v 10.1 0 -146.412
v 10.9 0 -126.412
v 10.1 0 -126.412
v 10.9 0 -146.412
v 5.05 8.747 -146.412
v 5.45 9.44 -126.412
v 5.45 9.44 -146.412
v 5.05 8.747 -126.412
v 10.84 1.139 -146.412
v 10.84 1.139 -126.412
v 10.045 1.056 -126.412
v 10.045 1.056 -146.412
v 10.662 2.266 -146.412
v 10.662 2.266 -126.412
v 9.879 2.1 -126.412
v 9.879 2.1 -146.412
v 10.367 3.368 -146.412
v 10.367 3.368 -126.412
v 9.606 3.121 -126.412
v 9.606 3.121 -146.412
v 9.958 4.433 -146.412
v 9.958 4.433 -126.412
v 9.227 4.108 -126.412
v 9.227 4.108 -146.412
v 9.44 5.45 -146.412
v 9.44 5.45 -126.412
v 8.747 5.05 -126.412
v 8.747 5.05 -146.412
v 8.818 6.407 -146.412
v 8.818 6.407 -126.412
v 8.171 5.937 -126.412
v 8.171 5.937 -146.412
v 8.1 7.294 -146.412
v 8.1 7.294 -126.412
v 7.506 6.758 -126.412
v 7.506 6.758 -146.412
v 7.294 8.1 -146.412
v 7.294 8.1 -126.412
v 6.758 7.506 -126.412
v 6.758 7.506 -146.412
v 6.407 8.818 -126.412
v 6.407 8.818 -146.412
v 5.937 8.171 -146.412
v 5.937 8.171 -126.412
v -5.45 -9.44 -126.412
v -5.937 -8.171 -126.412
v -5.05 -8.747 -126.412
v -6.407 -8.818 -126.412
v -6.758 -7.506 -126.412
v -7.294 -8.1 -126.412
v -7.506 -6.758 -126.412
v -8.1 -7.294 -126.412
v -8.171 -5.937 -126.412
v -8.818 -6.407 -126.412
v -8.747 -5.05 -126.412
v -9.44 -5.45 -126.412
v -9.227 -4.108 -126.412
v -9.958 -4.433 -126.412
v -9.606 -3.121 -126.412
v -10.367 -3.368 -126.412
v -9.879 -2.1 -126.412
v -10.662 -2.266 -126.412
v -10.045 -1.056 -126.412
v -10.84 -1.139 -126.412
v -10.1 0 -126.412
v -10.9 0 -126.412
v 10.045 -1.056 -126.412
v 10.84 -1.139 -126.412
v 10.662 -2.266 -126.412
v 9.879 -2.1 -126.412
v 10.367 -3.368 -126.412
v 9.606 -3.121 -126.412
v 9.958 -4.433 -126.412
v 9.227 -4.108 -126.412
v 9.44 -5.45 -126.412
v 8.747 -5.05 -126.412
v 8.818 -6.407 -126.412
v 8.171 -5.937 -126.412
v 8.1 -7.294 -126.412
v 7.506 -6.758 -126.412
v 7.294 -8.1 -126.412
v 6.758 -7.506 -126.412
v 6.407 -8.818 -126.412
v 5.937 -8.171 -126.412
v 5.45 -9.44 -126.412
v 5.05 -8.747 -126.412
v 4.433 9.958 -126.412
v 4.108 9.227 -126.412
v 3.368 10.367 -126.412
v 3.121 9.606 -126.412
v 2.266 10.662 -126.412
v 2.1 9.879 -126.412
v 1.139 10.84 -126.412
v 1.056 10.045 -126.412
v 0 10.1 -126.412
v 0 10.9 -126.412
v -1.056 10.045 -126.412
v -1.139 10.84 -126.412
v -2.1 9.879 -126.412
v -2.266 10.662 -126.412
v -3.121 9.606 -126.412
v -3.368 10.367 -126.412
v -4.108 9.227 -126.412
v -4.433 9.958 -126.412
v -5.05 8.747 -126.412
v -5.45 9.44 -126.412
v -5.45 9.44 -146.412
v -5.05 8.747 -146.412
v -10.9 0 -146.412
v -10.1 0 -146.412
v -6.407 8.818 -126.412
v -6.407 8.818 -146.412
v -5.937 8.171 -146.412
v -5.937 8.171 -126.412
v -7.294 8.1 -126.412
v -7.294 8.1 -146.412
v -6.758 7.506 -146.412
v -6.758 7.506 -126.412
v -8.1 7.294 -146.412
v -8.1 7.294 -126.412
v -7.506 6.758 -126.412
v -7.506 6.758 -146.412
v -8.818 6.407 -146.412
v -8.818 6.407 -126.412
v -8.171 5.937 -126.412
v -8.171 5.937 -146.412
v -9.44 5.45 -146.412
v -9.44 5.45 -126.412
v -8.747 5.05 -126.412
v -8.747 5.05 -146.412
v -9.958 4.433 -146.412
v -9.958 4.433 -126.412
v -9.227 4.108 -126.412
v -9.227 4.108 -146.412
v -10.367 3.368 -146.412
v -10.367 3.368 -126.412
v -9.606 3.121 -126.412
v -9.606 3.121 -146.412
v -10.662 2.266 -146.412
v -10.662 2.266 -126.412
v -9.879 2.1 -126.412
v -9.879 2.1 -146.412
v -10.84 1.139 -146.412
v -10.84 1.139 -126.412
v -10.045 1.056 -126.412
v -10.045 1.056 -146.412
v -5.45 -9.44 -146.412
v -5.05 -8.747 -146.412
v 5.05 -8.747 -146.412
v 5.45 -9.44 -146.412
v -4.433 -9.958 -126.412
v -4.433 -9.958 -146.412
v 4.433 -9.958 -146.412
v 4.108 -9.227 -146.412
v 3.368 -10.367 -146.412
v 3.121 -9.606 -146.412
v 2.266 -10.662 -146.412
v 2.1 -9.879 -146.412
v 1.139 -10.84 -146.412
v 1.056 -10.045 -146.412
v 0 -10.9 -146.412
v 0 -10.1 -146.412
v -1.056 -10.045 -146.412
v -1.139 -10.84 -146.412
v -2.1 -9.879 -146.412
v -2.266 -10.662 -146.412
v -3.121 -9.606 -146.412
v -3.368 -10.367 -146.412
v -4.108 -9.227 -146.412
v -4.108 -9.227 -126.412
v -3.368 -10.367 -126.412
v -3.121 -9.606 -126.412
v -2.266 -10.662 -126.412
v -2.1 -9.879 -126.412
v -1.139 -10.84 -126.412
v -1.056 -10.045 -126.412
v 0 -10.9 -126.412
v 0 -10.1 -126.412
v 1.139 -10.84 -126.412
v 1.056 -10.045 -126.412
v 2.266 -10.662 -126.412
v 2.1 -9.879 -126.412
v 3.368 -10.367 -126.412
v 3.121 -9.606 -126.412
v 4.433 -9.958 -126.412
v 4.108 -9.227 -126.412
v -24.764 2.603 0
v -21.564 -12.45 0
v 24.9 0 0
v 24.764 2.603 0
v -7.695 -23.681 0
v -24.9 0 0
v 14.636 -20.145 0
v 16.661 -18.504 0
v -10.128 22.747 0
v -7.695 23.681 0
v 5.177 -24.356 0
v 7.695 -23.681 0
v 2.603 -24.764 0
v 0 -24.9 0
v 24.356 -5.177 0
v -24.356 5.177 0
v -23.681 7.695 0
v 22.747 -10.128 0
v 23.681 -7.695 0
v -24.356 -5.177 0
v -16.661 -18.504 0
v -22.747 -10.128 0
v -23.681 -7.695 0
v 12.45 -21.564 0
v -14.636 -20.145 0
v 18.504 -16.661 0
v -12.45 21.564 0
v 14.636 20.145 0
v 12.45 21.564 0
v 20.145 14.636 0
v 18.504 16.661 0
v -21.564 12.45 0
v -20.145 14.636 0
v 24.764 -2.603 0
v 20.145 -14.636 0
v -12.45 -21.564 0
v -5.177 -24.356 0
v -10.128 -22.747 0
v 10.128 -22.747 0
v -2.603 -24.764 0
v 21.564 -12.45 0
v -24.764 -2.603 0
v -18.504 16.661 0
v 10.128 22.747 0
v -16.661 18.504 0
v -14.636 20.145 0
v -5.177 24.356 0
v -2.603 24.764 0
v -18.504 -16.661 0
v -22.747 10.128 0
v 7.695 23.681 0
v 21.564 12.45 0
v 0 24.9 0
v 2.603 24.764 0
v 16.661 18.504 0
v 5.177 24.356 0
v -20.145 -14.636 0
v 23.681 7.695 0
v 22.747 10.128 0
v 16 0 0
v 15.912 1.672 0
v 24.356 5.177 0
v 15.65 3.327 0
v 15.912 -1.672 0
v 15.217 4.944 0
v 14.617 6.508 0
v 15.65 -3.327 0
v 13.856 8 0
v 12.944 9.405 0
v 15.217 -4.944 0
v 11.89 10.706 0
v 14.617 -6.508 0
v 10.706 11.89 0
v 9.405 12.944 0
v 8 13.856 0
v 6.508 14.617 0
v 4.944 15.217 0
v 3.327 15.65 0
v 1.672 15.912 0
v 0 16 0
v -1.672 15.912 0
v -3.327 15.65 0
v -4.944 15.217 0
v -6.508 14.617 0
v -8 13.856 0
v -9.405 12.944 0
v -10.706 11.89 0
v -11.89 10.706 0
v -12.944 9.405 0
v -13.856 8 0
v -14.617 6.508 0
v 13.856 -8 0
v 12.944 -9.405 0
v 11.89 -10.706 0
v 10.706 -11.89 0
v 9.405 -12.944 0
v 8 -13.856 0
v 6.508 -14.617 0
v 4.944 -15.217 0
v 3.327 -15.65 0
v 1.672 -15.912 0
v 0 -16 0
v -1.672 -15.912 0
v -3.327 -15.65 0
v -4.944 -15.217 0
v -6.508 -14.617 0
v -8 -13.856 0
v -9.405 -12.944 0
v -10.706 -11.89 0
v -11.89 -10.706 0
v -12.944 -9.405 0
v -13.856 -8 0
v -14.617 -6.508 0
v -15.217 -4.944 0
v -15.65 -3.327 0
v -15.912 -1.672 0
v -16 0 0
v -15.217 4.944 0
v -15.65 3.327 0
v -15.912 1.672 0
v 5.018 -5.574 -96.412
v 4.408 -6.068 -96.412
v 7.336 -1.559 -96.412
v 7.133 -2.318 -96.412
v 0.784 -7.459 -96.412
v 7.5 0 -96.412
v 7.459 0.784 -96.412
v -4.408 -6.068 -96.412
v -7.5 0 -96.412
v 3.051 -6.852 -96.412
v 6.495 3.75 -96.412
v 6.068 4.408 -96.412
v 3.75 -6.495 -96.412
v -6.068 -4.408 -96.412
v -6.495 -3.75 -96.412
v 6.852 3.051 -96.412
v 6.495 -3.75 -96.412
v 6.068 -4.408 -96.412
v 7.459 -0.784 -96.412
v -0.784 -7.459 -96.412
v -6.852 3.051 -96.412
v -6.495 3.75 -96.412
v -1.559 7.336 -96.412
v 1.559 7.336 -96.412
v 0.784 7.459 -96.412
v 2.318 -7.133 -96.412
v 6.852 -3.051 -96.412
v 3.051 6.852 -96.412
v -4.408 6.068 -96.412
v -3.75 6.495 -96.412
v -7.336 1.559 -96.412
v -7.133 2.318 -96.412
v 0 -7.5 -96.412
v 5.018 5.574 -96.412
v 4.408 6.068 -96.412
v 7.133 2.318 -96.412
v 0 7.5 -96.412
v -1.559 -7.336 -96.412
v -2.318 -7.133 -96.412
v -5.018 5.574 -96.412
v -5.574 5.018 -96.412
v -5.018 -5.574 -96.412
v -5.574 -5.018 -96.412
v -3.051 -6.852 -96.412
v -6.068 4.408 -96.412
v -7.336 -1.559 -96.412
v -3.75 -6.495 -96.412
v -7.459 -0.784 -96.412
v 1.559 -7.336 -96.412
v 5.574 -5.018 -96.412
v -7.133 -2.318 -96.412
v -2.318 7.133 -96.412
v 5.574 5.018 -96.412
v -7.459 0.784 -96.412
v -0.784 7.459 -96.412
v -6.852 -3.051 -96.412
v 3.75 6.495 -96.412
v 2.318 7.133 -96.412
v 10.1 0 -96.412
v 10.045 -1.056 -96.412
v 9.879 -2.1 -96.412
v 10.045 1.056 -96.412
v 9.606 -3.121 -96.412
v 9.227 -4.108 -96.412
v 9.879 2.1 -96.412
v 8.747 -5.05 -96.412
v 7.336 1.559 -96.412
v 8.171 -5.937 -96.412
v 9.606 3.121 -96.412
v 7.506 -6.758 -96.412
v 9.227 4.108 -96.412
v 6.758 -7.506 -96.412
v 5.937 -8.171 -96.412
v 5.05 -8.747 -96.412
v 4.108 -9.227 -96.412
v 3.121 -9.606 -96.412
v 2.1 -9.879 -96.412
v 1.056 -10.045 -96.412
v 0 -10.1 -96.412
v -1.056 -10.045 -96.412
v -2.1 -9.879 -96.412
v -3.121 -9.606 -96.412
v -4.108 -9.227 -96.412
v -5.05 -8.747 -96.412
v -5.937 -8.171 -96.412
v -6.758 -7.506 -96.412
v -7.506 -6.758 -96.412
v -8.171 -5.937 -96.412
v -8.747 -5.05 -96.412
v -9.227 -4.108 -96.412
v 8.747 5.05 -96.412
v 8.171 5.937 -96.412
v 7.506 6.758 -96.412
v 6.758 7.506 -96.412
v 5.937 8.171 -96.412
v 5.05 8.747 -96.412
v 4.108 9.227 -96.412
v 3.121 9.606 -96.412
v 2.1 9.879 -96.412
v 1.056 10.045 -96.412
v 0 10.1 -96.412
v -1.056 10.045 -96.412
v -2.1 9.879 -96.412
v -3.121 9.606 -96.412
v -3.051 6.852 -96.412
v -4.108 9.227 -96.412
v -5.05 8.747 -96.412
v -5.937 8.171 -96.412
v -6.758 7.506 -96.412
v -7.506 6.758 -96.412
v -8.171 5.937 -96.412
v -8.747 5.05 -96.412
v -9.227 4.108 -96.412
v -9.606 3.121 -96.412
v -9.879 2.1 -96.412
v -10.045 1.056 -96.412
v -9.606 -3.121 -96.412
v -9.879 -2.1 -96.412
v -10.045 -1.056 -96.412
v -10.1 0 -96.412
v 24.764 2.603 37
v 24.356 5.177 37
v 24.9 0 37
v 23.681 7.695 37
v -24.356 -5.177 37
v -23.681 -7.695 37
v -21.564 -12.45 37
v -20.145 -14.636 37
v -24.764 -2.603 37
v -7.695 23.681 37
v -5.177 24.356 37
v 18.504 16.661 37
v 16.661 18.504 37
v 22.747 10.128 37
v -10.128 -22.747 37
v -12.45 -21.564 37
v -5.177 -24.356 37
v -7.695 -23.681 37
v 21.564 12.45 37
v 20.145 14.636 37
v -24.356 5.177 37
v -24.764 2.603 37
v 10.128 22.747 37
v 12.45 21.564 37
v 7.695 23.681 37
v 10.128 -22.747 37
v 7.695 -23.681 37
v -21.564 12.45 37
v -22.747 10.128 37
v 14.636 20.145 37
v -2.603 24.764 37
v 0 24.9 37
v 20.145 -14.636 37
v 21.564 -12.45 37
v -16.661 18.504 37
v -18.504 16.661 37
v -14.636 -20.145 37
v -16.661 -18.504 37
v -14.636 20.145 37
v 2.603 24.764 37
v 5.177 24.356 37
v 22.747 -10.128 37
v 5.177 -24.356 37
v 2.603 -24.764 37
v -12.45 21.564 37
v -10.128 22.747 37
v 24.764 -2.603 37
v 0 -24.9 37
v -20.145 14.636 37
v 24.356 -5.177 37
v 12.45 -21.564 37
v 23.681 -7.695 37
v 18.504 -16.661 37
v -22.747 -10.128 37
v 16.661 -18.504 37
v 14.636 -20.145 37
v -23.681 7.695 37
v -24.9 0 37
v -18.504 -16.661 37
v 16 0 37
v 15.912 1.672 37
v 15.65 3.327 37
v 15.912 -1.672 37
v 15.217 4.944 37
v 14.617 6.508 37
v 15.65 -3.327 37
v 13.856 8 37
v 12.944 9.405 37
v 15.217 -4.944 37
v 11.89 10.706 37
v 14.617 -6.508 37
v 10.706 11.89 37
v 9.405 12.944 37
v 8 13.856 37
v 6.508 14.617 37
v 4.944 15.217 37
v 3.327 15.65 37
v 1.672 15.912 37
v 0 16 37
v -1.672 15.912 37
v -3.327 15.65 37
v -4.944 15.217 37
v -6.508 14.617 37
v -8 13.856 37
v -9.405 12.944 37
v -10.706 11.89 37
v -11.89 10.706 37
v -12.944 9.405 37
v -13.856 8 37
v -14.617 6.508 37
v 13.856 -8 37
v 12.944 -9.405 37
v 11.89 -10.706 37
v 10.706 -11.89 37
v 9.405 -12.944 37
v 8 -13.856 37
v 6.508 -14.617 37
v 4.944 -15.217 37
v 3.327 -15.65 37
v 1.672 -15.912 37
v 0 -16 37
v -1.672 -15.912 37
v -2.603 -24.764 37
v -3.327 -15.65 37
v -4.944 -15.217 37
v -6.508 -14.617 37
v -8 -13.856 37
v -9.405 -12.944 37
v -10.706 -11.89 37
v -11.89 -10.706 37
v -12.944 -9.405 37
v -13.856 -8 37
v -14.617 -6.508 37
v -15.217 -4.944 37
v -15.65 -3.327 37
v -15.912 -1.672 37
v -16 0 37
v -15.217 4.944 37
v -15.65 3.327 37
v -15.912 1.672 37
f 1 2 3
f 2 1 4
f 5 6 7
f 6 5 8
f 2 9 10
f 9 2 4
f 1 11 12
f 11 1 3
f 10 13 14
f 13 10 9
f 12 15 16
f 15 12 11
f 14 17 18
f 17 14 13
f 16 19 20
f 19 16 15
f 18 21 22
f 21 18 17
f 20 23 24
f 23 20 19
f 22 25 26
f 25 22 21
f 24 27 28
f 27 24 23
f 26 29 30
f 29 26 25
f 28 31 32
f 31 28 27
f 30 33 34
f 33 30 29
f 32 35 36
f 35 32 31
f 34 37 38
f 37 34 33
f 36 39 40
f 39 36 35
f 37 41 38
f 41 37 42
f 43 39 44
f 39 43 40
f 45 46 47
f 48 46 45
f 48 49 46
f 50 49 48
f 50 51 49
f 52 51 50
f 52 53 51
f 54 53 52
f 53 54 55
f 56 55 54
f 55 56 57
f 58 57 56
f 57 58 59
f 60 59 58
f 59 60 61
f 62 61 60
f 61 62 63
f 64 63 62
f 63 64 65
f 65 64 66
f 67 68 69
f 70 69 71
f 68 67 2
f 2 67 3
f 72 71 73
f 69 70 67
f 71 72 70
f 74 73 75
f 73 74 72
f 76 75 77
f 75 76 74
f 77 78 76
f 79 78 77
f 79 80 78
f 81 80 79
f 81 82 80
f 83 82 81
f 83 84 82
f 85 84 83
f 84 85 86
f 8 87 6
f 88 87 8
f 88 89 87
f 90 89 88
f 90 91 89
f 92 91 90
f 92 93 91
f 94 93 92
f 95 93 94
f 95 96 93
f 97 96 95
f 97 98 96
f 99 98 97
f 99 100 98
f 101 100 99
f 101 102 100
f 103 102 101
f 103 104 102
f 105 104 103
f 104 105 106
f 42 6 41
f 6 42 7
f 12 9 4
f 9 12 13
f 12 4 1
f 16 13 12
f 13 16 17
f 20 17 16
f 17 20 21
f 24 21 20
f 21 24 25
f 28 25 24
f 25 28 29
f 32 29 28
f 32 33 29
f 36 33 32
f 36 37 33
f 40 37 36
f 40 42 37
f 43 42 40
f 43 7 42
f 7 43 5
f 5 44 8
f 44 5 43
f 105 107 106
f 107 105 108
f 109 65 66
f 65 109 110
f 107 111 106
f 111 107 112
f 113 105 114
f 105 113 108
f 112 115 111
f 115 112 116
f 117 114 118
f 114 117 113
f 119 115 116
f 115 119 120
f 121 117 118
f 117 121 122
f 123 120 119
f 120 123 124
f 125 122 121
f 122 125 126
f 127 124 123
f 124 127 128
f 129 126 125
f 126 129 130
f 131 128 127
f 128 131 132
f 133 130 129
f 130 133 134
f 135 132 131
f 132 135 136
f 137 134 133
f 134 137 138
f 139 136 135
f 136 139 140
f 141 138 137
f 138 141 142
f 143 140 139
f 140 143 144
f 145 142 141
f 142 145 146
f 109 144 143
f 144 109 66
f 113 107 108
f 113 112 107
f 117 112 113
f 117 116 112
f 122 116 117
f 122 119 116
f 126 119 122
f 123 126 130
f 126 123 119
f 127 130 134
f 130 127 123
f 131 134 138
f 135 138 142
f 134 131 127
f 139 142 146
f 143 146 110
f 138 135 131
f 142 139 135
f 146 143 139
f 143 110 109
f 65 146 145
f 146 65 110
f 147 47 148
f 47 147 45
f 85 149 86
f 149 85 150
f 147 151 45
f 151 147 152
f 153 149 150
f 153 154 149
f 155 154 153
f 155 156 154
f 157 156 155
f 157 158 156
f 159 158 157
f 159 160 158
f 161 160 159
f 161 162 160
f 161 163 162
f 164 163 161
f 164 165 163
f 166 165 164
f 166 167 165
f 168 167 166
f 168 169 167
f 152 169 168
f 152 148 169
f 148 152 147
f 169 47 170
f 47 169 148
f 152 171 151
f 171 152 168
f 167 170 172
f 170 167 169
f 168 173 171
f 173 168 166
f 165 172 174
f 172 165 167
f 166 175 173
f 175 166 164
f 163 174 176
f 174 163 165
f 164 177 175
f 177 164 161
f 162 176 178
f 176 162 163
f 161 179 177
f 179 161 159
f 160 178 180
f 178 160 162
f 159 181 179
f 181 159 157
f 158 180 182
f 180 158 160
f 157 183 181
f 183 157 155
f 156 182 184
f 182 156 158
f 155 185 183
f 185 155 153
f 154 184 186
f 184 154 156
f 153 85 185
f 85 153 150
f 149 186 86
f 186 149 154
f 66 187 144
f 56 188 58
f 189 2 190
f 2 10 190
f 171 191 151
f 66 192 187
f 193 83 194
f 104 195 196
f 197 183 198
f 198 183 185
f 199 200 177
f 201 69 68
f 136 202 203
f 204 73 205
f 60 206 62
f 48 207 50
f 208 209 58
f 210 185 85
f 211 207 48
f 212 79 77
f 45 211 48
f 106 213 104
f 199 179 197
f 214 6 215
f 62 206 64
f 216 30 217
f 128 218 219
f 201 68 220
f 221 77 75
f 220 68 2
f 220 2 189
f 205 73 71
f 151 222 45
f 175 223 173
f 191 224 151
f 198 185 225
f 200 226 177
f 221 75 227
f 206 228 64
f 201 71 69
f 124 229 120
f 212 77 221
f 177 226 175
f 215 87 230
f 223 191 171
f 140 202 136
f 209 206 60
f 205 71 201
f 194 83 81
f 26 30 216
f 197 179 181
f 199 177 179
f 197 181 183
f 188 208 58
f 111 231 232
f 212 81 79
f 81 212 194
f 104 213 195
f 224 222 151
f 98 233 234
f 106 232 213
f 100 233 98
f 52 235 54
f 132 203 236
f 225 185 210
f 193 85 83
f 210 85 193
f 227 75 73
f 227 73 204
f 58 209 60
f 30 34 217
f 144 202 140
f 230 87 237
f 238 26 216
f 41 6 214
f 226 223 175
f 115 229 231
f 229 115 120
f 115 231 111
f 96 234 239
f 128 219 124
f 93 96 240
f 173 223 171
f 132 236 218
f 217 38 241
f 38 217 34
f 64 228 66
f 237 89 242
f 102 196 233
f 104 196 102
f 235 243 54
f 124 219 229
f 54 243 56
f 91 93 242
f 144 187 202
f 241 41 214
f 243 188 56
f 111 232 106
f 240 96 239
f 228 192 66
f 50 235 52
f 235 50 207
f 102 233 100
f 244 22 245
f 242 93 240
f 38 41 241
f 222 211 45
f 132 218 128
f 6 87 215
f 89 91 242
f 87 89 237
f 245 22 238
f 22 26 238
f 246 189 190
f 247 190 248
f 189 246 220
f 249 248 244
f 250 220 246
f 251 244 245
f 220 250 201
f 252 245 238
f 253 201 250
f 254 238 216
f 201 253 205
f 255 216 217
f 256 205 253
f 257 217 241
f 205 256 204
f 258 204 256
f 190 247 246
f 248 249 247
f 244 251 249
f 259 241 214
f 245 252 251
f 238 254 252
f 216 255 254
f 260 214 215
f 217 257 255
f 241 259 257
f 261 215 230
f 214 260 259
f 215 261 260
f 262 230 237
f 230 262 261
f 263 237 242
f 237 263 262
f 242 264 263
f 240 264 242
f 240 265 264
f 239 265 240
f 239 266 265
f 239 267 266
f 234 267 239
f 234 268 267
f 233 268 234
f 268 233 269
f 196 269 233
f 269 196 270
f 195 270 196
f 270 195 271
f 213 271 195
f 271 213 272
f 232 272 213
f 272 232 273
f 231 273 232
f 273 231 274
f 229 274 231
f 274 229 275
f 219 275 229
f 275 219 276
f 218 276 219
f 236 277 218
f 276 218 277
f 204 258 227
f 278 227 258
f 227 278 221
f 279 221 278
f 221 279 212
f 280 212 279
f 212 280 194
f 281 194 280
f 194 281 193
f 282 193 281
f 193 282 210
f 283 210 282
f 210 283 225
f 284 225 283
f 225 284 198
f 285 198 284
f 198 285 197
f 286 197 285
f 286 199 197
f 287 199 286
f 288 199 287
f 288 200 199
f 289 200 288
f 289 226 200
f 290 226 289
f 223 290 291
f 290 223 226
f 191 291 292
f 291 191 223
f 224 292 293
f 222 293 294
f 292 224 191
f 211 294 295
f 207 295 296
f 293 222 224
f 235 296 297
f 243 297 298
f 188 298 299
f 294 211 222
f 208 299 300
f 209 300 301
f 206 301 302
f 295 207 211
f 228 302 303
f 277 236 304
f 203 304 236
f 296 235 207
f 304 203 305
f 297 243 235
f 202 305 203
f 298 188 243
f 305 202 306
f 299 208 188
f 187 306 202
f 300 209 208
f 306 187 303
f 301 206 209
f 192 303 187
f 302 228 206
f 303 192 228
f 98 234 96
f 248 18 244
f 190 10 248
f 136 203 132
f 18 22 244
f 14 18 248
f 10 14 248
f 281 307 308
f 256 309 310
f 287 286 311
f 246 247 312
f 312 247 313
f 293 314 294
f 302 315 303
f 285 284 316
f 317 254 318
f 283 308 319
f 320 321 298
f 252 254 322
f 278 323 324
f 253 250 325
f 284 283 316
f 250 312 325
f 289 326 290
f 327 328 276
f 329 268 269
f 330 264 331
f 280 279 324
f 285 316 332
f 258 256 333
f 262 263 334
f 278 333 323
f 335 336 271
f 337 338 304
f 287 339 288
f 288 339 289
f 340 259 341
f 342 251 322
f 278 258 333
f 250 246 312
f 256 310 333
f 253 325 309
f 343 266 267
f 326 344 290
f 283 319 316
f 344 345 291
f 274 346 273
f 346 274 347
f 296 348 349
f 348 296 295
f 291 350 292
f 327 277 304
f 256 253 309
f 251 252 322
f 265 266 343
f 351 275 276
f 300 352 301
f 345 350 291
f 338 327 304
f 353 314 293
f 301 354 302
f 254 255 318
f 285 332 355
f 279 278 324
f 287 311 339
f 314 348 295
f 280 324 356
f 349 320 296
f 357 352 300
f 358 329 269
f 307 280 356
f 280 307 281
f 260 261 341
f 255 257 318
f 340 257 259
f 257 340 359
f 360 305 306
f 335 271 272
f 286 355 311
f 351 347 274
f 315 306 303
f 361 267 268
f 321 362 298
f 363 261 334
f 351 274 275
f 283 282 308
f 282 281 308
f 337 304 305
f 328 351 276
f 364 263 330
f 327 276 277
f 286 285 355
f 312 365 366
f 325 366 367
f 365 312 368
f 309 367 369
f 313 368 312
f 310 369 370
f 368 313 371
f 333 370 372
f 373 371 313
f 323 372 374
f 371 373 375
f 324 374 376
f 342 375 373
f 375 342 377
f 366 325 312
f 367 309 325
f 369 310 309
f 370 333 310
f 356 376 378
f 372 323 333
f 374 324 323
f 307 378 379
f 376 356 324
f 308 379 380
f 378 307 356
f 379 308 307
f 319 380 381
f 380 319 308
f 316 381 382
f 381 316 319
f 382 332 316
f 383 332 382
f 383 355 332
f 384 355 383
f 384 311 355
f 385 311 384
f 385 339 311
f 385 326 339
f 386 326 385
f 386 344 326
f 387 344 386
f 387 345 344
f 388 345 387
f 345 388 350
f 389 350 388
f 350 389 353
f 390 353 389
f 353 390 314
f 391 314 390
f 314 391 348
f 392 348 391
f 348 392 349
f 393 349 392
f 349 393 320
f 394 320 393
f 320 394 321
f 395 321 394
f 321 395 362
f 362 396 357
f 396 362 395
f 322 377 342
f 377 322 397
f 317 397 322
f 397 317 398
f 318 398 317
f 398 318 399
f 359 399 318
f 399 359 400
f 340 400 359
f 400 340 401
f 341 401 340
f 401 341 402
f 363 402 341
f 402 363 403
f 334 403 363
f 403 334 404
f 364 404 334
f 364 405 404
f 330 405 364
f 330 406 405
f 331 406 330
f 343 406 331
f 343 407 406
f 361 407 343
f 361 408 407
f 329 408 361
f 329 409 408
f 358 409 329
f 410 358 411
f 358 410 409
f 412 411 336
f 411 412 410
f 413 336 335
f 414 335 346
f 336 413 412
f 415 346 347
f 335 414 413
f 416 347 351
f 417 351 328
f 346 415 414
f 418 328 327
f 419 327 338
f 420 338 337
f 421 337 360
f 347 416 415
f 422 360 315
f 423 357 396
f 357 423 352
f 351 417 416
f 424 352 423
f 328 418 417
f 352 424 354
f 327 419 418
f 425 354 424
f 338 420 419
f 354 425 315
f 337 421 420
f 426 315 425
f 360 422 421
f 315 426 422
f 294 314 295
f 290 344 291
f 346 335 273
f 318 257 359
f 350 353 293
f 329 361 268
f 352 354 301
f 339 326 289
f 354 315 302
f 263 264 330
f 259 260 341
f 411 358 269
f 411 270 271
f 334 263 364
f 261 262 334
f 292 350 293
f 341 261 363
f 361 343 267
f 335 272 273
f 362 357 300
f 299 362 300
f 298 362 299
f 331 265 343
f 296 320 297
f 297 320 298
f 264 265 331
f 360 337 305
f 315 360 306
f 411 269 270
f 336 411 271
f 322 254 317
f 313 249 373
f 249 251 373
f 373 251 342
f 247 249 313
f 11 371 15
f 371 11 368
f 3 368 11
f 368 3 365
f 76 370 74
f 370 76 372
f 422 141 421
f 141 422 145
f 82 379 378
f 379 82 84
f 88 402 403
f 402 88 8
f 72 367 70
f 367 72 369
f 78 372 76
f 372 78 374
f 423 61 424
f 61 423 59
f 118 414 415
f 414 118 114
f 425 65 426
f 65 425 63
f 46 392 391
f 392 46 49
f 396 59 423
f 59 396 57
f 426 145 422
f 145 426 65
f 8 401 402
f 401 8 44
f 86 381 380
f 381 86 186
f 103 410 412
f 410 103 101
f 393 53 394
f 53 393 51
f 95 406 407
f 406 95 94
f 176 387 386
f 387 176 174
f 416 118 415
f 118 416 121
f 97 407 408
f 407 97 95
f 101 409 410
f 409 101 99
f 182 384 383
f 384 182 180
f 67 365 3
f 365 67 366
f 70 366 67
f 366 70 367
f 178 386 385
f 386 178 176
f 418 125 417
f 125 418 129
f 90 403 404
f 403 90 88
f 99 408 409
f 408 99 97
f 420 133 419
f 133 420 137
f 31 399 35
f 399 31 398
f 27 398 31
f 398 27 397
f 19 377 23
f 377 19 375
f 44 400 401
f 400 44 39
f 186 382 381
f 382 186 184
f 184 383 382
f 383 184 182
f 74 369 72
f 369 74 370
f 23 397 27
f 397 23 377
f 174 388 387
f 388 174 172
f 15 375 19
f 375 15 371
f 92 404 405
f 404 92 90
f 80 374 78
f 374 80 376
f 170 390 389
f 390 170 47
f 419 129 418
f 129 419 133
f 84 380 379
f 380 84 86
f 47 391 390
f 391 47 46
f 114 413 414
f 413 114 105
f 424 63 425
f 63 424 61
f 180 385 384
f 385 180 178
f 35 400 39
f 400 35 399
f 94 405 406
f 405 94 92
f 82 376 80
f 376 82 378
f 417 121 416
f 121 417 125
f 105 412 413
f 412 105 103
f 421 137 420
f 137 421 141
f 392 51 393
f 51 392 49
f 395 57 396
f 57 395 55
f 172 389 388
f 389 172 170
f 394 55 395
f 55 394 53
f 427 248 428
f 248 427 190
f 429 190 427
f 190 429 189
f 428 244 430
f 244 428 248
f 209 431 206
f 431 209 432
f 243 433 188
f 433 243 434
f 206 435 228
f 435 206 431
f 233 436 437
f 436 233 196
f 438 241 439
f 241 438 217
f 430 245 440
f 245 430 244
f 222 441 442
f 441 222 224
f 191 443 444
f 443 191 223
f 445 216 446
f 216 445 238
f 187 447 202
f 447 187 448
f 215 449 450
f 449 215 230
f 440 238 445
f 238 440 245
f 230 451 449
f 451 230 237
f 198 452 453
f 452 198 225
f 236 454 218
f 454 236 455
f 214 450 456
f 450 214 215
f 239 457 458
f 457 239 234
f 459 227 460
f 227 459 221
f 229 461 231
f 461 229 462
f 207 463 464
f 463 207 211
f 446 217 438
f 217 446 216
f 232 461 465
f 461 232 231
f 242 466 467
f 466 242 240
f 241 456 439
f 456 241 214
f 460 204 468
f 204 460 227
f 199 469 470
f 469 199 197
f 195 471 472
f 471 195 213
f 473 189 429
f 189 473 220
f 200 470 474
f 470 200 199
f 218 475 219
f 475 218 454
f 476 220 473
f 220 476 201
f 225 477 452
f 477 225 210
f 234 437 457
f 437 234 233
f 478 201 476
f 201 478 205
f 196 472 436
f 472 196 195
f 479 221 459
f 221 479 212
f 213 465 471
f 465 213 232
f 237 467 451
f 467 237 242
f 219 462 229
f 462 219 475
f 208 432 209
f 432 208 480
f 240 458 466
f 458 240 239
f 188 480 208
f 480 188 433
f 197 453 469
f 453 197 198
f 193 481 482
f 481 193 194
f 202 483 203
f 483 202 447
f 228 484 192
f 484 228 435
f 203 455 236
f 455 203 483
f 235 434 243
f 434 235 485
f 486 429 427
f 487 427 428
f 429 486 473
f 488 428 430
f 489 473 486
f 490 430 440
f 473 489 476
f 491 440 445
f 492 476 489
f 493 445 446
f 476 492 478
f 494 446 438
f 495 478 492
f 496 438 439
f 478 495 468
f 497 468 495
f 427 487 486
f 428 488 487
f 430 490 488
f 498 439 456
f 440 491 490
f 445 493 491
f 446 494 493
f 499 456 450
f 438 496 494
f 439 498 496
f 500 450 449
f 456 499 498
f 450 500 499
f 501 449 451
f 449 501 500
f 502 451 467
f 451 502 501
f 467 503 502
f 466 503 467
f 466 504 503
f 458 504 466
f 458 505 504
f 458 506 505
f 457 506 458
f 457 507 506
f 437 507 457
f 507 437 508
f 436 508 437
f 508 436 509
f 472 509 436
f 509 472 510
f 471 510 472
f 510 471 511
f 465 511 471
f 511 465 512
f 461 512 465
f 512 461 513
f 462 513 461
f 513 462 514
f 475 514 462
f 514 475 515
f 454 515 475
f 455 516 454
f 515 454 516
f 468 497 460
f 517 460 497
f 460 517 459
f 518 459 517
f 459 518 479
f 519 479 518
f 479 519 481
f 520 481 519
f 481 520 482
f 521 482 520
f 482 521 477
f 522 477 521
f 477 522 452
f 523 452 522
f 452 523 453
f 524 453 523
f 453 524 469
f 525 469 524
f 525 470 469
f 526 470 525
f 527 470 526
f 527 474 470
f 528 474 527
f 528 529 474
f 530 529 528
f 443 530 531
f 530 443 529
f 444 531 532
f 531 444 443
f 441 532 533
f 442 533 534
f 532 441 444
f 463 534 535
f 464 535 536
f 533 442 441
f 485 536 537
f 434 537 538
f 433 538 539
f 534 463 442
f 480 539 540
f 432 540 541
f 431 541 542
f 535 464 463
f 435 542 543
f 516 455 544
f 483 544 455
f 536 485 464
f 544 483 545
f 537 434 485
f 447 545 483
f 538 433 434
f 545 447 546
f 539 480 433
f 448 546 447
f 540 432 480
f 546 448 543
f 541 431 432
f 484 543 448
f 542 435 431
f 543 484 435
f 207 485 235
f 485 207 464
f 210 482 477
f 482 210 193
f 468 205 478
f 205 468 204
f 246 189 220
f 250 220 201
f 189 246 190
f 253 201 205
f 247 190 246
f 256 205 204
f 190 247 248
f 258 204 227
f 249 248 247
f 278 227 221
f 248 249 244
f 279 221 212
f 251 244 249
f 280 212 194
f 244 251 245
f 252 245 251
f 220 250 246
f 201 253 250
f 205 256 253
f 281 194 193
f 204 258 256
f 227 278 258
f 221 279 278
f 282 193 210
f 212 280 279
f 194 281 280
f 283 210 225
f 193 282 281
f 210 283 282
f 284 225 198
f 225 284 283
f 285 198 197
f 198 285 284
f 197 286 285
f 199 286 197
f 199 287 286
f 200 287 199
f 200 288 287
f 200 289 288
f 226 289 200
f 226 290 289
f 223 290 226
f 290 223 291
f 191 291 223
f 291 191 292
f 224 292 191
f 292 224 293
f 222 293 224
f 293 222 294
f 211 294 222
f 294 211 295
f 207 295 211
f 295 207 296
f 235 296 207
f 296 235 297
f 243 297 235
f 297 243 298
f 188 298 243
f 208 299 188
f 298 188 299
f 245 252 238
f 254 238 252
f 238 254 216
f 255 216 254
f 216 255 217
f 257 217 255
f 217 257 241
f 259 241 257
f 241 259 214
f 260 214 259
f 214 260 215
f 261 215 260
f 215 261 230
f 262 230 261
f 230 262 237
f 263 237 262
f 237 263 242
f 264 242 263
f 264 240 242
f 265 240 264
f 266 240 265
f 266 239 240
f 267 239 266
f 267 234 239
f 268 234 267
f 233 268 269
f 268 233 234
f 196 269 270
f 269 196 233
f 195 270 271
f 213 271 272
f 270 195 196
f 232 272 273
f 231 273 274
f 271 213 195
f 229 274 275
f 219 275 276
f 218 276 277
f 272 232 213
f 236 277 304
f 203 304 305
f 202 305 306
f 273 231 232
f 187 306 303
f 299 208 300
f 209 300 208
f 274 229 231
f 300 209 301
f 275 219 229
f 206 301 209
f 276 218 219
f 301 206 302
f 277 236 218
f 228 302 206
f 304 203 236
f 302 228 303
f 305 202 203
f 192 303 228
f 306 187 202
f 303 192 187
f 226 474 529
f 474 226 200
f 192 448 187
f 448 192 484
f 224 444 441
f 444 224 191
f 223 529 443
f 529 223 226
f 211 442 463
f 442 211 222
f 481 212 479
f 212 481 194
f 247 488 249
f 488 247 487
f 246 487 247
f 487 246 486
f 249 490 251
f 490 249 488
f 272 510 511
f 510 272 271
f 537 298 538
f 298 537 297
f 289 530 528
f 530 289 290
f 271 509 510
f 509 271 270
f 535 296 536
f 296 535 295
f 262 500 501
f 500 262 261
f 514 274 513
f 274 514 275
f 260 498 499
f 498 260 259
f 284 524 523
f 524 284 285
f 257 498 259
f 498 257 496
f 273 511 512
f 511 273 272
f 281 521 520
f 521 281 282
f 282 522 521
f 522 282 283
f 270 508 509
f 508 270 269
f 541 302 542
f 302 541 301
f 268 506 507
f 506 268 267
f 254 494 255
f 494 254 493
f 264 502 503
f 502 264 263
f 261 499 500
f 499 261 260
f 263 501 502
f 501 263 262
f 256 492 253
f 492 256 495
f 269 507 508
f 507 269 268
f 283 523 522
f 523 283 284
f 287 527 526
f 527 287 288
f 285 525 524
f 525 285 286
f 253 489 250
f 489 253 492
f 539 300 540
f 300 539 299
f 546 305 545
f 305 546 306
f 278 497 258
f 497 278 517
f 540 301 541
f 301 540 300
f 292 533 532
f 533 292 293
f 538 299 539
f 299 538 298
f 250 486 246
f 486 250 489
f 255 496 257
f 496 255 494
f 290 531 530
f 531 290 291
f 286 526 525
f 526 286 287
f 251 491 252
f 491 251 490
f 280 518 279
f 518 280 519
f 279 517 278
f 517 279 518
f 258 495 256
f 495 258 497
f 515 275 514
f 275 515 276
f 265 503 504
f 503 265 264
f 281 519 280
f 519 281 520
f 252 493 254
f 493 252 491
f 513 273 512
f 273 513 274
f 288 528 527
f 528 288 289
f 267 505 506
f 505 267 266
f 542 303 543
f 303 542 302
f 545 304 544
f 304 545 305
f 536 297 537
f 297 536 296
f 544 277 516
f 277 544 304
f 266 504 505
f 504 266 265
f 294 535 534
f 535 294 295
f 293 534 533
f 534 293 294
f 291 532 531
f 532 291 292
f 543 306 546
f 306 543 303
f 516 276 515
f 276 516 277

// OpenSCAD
// tube inner diameter (mm)
tube_inner = 15;

// tube outer diameter (mm)
tube_outer = 20.2;

// diffusor/tube overlap (mm)
tube_overlap = 30;

// diffusor/tube wing length (mm)
tube_wing_length = 20;

// hose inner diameter (mm)
hose_inner = 32;

// hose outer diameter (mm)
hose_outer = 49.8; // 39;


// diffuser angle (°)
alpha = 10;

/* [Hidden] */
$fn = 60;

length = (hose_inner - tube_inner) / tan(alpha);
echo(length);

module hose() {
    difference() {
        union() {
            cylinder(d=34, h=30);
            for (i = [0:5]) {
                translate([0, 0, 5*i]) {
                    cylinder(d=39, h=1.6);
                    translate([0, 0, 2.5]) cylinder(d=35, h=1.6);
                }
            }
        }
        cylinder(d=32, h=30);
    }
}

module tube() {
    translate([0, 0, -60]) difference() {
        cylinder(d=20, h=60);
        cylinder(d=15, h=60);
    }
}

module diffuser() {
    difference() {
        union() {
            translate([0, 0, -tube_overlap]) {
                cylinder(
                    d1 = tube_outer + 2*0.8,
                    d2 = hose_outer,
                    h = length + tube_overlap
                );
                translate([0, 0, -tube_wing_length]) {
                    for (phi = [0:120:240]) {
                        rotate([0, 0, phi])
                        rotate_extrude(angle = 60) {
                            translate([tube_outer/2, 0, 0])
                            square([0.8, tube_wing_length]);
                        }
                    }
                }
            }
        }
        union() {
            cylinder(d1=tube_inner, d2=hose_inner, h=length);
            translate([0, 0, -tube_overlap]) {
                cylinder(d=tube_outer, h=tube_overlap);
            }
        }
    }
    translate([0, 0, length]) difference() {
        cylinder(d=hose_outer, h=37);
        cylinder(d=hose_inner, h=37);
    }
}


%hose();
%translate([0, 0, -length]) tube();
translate([0, 0, -length]) diffuser();
